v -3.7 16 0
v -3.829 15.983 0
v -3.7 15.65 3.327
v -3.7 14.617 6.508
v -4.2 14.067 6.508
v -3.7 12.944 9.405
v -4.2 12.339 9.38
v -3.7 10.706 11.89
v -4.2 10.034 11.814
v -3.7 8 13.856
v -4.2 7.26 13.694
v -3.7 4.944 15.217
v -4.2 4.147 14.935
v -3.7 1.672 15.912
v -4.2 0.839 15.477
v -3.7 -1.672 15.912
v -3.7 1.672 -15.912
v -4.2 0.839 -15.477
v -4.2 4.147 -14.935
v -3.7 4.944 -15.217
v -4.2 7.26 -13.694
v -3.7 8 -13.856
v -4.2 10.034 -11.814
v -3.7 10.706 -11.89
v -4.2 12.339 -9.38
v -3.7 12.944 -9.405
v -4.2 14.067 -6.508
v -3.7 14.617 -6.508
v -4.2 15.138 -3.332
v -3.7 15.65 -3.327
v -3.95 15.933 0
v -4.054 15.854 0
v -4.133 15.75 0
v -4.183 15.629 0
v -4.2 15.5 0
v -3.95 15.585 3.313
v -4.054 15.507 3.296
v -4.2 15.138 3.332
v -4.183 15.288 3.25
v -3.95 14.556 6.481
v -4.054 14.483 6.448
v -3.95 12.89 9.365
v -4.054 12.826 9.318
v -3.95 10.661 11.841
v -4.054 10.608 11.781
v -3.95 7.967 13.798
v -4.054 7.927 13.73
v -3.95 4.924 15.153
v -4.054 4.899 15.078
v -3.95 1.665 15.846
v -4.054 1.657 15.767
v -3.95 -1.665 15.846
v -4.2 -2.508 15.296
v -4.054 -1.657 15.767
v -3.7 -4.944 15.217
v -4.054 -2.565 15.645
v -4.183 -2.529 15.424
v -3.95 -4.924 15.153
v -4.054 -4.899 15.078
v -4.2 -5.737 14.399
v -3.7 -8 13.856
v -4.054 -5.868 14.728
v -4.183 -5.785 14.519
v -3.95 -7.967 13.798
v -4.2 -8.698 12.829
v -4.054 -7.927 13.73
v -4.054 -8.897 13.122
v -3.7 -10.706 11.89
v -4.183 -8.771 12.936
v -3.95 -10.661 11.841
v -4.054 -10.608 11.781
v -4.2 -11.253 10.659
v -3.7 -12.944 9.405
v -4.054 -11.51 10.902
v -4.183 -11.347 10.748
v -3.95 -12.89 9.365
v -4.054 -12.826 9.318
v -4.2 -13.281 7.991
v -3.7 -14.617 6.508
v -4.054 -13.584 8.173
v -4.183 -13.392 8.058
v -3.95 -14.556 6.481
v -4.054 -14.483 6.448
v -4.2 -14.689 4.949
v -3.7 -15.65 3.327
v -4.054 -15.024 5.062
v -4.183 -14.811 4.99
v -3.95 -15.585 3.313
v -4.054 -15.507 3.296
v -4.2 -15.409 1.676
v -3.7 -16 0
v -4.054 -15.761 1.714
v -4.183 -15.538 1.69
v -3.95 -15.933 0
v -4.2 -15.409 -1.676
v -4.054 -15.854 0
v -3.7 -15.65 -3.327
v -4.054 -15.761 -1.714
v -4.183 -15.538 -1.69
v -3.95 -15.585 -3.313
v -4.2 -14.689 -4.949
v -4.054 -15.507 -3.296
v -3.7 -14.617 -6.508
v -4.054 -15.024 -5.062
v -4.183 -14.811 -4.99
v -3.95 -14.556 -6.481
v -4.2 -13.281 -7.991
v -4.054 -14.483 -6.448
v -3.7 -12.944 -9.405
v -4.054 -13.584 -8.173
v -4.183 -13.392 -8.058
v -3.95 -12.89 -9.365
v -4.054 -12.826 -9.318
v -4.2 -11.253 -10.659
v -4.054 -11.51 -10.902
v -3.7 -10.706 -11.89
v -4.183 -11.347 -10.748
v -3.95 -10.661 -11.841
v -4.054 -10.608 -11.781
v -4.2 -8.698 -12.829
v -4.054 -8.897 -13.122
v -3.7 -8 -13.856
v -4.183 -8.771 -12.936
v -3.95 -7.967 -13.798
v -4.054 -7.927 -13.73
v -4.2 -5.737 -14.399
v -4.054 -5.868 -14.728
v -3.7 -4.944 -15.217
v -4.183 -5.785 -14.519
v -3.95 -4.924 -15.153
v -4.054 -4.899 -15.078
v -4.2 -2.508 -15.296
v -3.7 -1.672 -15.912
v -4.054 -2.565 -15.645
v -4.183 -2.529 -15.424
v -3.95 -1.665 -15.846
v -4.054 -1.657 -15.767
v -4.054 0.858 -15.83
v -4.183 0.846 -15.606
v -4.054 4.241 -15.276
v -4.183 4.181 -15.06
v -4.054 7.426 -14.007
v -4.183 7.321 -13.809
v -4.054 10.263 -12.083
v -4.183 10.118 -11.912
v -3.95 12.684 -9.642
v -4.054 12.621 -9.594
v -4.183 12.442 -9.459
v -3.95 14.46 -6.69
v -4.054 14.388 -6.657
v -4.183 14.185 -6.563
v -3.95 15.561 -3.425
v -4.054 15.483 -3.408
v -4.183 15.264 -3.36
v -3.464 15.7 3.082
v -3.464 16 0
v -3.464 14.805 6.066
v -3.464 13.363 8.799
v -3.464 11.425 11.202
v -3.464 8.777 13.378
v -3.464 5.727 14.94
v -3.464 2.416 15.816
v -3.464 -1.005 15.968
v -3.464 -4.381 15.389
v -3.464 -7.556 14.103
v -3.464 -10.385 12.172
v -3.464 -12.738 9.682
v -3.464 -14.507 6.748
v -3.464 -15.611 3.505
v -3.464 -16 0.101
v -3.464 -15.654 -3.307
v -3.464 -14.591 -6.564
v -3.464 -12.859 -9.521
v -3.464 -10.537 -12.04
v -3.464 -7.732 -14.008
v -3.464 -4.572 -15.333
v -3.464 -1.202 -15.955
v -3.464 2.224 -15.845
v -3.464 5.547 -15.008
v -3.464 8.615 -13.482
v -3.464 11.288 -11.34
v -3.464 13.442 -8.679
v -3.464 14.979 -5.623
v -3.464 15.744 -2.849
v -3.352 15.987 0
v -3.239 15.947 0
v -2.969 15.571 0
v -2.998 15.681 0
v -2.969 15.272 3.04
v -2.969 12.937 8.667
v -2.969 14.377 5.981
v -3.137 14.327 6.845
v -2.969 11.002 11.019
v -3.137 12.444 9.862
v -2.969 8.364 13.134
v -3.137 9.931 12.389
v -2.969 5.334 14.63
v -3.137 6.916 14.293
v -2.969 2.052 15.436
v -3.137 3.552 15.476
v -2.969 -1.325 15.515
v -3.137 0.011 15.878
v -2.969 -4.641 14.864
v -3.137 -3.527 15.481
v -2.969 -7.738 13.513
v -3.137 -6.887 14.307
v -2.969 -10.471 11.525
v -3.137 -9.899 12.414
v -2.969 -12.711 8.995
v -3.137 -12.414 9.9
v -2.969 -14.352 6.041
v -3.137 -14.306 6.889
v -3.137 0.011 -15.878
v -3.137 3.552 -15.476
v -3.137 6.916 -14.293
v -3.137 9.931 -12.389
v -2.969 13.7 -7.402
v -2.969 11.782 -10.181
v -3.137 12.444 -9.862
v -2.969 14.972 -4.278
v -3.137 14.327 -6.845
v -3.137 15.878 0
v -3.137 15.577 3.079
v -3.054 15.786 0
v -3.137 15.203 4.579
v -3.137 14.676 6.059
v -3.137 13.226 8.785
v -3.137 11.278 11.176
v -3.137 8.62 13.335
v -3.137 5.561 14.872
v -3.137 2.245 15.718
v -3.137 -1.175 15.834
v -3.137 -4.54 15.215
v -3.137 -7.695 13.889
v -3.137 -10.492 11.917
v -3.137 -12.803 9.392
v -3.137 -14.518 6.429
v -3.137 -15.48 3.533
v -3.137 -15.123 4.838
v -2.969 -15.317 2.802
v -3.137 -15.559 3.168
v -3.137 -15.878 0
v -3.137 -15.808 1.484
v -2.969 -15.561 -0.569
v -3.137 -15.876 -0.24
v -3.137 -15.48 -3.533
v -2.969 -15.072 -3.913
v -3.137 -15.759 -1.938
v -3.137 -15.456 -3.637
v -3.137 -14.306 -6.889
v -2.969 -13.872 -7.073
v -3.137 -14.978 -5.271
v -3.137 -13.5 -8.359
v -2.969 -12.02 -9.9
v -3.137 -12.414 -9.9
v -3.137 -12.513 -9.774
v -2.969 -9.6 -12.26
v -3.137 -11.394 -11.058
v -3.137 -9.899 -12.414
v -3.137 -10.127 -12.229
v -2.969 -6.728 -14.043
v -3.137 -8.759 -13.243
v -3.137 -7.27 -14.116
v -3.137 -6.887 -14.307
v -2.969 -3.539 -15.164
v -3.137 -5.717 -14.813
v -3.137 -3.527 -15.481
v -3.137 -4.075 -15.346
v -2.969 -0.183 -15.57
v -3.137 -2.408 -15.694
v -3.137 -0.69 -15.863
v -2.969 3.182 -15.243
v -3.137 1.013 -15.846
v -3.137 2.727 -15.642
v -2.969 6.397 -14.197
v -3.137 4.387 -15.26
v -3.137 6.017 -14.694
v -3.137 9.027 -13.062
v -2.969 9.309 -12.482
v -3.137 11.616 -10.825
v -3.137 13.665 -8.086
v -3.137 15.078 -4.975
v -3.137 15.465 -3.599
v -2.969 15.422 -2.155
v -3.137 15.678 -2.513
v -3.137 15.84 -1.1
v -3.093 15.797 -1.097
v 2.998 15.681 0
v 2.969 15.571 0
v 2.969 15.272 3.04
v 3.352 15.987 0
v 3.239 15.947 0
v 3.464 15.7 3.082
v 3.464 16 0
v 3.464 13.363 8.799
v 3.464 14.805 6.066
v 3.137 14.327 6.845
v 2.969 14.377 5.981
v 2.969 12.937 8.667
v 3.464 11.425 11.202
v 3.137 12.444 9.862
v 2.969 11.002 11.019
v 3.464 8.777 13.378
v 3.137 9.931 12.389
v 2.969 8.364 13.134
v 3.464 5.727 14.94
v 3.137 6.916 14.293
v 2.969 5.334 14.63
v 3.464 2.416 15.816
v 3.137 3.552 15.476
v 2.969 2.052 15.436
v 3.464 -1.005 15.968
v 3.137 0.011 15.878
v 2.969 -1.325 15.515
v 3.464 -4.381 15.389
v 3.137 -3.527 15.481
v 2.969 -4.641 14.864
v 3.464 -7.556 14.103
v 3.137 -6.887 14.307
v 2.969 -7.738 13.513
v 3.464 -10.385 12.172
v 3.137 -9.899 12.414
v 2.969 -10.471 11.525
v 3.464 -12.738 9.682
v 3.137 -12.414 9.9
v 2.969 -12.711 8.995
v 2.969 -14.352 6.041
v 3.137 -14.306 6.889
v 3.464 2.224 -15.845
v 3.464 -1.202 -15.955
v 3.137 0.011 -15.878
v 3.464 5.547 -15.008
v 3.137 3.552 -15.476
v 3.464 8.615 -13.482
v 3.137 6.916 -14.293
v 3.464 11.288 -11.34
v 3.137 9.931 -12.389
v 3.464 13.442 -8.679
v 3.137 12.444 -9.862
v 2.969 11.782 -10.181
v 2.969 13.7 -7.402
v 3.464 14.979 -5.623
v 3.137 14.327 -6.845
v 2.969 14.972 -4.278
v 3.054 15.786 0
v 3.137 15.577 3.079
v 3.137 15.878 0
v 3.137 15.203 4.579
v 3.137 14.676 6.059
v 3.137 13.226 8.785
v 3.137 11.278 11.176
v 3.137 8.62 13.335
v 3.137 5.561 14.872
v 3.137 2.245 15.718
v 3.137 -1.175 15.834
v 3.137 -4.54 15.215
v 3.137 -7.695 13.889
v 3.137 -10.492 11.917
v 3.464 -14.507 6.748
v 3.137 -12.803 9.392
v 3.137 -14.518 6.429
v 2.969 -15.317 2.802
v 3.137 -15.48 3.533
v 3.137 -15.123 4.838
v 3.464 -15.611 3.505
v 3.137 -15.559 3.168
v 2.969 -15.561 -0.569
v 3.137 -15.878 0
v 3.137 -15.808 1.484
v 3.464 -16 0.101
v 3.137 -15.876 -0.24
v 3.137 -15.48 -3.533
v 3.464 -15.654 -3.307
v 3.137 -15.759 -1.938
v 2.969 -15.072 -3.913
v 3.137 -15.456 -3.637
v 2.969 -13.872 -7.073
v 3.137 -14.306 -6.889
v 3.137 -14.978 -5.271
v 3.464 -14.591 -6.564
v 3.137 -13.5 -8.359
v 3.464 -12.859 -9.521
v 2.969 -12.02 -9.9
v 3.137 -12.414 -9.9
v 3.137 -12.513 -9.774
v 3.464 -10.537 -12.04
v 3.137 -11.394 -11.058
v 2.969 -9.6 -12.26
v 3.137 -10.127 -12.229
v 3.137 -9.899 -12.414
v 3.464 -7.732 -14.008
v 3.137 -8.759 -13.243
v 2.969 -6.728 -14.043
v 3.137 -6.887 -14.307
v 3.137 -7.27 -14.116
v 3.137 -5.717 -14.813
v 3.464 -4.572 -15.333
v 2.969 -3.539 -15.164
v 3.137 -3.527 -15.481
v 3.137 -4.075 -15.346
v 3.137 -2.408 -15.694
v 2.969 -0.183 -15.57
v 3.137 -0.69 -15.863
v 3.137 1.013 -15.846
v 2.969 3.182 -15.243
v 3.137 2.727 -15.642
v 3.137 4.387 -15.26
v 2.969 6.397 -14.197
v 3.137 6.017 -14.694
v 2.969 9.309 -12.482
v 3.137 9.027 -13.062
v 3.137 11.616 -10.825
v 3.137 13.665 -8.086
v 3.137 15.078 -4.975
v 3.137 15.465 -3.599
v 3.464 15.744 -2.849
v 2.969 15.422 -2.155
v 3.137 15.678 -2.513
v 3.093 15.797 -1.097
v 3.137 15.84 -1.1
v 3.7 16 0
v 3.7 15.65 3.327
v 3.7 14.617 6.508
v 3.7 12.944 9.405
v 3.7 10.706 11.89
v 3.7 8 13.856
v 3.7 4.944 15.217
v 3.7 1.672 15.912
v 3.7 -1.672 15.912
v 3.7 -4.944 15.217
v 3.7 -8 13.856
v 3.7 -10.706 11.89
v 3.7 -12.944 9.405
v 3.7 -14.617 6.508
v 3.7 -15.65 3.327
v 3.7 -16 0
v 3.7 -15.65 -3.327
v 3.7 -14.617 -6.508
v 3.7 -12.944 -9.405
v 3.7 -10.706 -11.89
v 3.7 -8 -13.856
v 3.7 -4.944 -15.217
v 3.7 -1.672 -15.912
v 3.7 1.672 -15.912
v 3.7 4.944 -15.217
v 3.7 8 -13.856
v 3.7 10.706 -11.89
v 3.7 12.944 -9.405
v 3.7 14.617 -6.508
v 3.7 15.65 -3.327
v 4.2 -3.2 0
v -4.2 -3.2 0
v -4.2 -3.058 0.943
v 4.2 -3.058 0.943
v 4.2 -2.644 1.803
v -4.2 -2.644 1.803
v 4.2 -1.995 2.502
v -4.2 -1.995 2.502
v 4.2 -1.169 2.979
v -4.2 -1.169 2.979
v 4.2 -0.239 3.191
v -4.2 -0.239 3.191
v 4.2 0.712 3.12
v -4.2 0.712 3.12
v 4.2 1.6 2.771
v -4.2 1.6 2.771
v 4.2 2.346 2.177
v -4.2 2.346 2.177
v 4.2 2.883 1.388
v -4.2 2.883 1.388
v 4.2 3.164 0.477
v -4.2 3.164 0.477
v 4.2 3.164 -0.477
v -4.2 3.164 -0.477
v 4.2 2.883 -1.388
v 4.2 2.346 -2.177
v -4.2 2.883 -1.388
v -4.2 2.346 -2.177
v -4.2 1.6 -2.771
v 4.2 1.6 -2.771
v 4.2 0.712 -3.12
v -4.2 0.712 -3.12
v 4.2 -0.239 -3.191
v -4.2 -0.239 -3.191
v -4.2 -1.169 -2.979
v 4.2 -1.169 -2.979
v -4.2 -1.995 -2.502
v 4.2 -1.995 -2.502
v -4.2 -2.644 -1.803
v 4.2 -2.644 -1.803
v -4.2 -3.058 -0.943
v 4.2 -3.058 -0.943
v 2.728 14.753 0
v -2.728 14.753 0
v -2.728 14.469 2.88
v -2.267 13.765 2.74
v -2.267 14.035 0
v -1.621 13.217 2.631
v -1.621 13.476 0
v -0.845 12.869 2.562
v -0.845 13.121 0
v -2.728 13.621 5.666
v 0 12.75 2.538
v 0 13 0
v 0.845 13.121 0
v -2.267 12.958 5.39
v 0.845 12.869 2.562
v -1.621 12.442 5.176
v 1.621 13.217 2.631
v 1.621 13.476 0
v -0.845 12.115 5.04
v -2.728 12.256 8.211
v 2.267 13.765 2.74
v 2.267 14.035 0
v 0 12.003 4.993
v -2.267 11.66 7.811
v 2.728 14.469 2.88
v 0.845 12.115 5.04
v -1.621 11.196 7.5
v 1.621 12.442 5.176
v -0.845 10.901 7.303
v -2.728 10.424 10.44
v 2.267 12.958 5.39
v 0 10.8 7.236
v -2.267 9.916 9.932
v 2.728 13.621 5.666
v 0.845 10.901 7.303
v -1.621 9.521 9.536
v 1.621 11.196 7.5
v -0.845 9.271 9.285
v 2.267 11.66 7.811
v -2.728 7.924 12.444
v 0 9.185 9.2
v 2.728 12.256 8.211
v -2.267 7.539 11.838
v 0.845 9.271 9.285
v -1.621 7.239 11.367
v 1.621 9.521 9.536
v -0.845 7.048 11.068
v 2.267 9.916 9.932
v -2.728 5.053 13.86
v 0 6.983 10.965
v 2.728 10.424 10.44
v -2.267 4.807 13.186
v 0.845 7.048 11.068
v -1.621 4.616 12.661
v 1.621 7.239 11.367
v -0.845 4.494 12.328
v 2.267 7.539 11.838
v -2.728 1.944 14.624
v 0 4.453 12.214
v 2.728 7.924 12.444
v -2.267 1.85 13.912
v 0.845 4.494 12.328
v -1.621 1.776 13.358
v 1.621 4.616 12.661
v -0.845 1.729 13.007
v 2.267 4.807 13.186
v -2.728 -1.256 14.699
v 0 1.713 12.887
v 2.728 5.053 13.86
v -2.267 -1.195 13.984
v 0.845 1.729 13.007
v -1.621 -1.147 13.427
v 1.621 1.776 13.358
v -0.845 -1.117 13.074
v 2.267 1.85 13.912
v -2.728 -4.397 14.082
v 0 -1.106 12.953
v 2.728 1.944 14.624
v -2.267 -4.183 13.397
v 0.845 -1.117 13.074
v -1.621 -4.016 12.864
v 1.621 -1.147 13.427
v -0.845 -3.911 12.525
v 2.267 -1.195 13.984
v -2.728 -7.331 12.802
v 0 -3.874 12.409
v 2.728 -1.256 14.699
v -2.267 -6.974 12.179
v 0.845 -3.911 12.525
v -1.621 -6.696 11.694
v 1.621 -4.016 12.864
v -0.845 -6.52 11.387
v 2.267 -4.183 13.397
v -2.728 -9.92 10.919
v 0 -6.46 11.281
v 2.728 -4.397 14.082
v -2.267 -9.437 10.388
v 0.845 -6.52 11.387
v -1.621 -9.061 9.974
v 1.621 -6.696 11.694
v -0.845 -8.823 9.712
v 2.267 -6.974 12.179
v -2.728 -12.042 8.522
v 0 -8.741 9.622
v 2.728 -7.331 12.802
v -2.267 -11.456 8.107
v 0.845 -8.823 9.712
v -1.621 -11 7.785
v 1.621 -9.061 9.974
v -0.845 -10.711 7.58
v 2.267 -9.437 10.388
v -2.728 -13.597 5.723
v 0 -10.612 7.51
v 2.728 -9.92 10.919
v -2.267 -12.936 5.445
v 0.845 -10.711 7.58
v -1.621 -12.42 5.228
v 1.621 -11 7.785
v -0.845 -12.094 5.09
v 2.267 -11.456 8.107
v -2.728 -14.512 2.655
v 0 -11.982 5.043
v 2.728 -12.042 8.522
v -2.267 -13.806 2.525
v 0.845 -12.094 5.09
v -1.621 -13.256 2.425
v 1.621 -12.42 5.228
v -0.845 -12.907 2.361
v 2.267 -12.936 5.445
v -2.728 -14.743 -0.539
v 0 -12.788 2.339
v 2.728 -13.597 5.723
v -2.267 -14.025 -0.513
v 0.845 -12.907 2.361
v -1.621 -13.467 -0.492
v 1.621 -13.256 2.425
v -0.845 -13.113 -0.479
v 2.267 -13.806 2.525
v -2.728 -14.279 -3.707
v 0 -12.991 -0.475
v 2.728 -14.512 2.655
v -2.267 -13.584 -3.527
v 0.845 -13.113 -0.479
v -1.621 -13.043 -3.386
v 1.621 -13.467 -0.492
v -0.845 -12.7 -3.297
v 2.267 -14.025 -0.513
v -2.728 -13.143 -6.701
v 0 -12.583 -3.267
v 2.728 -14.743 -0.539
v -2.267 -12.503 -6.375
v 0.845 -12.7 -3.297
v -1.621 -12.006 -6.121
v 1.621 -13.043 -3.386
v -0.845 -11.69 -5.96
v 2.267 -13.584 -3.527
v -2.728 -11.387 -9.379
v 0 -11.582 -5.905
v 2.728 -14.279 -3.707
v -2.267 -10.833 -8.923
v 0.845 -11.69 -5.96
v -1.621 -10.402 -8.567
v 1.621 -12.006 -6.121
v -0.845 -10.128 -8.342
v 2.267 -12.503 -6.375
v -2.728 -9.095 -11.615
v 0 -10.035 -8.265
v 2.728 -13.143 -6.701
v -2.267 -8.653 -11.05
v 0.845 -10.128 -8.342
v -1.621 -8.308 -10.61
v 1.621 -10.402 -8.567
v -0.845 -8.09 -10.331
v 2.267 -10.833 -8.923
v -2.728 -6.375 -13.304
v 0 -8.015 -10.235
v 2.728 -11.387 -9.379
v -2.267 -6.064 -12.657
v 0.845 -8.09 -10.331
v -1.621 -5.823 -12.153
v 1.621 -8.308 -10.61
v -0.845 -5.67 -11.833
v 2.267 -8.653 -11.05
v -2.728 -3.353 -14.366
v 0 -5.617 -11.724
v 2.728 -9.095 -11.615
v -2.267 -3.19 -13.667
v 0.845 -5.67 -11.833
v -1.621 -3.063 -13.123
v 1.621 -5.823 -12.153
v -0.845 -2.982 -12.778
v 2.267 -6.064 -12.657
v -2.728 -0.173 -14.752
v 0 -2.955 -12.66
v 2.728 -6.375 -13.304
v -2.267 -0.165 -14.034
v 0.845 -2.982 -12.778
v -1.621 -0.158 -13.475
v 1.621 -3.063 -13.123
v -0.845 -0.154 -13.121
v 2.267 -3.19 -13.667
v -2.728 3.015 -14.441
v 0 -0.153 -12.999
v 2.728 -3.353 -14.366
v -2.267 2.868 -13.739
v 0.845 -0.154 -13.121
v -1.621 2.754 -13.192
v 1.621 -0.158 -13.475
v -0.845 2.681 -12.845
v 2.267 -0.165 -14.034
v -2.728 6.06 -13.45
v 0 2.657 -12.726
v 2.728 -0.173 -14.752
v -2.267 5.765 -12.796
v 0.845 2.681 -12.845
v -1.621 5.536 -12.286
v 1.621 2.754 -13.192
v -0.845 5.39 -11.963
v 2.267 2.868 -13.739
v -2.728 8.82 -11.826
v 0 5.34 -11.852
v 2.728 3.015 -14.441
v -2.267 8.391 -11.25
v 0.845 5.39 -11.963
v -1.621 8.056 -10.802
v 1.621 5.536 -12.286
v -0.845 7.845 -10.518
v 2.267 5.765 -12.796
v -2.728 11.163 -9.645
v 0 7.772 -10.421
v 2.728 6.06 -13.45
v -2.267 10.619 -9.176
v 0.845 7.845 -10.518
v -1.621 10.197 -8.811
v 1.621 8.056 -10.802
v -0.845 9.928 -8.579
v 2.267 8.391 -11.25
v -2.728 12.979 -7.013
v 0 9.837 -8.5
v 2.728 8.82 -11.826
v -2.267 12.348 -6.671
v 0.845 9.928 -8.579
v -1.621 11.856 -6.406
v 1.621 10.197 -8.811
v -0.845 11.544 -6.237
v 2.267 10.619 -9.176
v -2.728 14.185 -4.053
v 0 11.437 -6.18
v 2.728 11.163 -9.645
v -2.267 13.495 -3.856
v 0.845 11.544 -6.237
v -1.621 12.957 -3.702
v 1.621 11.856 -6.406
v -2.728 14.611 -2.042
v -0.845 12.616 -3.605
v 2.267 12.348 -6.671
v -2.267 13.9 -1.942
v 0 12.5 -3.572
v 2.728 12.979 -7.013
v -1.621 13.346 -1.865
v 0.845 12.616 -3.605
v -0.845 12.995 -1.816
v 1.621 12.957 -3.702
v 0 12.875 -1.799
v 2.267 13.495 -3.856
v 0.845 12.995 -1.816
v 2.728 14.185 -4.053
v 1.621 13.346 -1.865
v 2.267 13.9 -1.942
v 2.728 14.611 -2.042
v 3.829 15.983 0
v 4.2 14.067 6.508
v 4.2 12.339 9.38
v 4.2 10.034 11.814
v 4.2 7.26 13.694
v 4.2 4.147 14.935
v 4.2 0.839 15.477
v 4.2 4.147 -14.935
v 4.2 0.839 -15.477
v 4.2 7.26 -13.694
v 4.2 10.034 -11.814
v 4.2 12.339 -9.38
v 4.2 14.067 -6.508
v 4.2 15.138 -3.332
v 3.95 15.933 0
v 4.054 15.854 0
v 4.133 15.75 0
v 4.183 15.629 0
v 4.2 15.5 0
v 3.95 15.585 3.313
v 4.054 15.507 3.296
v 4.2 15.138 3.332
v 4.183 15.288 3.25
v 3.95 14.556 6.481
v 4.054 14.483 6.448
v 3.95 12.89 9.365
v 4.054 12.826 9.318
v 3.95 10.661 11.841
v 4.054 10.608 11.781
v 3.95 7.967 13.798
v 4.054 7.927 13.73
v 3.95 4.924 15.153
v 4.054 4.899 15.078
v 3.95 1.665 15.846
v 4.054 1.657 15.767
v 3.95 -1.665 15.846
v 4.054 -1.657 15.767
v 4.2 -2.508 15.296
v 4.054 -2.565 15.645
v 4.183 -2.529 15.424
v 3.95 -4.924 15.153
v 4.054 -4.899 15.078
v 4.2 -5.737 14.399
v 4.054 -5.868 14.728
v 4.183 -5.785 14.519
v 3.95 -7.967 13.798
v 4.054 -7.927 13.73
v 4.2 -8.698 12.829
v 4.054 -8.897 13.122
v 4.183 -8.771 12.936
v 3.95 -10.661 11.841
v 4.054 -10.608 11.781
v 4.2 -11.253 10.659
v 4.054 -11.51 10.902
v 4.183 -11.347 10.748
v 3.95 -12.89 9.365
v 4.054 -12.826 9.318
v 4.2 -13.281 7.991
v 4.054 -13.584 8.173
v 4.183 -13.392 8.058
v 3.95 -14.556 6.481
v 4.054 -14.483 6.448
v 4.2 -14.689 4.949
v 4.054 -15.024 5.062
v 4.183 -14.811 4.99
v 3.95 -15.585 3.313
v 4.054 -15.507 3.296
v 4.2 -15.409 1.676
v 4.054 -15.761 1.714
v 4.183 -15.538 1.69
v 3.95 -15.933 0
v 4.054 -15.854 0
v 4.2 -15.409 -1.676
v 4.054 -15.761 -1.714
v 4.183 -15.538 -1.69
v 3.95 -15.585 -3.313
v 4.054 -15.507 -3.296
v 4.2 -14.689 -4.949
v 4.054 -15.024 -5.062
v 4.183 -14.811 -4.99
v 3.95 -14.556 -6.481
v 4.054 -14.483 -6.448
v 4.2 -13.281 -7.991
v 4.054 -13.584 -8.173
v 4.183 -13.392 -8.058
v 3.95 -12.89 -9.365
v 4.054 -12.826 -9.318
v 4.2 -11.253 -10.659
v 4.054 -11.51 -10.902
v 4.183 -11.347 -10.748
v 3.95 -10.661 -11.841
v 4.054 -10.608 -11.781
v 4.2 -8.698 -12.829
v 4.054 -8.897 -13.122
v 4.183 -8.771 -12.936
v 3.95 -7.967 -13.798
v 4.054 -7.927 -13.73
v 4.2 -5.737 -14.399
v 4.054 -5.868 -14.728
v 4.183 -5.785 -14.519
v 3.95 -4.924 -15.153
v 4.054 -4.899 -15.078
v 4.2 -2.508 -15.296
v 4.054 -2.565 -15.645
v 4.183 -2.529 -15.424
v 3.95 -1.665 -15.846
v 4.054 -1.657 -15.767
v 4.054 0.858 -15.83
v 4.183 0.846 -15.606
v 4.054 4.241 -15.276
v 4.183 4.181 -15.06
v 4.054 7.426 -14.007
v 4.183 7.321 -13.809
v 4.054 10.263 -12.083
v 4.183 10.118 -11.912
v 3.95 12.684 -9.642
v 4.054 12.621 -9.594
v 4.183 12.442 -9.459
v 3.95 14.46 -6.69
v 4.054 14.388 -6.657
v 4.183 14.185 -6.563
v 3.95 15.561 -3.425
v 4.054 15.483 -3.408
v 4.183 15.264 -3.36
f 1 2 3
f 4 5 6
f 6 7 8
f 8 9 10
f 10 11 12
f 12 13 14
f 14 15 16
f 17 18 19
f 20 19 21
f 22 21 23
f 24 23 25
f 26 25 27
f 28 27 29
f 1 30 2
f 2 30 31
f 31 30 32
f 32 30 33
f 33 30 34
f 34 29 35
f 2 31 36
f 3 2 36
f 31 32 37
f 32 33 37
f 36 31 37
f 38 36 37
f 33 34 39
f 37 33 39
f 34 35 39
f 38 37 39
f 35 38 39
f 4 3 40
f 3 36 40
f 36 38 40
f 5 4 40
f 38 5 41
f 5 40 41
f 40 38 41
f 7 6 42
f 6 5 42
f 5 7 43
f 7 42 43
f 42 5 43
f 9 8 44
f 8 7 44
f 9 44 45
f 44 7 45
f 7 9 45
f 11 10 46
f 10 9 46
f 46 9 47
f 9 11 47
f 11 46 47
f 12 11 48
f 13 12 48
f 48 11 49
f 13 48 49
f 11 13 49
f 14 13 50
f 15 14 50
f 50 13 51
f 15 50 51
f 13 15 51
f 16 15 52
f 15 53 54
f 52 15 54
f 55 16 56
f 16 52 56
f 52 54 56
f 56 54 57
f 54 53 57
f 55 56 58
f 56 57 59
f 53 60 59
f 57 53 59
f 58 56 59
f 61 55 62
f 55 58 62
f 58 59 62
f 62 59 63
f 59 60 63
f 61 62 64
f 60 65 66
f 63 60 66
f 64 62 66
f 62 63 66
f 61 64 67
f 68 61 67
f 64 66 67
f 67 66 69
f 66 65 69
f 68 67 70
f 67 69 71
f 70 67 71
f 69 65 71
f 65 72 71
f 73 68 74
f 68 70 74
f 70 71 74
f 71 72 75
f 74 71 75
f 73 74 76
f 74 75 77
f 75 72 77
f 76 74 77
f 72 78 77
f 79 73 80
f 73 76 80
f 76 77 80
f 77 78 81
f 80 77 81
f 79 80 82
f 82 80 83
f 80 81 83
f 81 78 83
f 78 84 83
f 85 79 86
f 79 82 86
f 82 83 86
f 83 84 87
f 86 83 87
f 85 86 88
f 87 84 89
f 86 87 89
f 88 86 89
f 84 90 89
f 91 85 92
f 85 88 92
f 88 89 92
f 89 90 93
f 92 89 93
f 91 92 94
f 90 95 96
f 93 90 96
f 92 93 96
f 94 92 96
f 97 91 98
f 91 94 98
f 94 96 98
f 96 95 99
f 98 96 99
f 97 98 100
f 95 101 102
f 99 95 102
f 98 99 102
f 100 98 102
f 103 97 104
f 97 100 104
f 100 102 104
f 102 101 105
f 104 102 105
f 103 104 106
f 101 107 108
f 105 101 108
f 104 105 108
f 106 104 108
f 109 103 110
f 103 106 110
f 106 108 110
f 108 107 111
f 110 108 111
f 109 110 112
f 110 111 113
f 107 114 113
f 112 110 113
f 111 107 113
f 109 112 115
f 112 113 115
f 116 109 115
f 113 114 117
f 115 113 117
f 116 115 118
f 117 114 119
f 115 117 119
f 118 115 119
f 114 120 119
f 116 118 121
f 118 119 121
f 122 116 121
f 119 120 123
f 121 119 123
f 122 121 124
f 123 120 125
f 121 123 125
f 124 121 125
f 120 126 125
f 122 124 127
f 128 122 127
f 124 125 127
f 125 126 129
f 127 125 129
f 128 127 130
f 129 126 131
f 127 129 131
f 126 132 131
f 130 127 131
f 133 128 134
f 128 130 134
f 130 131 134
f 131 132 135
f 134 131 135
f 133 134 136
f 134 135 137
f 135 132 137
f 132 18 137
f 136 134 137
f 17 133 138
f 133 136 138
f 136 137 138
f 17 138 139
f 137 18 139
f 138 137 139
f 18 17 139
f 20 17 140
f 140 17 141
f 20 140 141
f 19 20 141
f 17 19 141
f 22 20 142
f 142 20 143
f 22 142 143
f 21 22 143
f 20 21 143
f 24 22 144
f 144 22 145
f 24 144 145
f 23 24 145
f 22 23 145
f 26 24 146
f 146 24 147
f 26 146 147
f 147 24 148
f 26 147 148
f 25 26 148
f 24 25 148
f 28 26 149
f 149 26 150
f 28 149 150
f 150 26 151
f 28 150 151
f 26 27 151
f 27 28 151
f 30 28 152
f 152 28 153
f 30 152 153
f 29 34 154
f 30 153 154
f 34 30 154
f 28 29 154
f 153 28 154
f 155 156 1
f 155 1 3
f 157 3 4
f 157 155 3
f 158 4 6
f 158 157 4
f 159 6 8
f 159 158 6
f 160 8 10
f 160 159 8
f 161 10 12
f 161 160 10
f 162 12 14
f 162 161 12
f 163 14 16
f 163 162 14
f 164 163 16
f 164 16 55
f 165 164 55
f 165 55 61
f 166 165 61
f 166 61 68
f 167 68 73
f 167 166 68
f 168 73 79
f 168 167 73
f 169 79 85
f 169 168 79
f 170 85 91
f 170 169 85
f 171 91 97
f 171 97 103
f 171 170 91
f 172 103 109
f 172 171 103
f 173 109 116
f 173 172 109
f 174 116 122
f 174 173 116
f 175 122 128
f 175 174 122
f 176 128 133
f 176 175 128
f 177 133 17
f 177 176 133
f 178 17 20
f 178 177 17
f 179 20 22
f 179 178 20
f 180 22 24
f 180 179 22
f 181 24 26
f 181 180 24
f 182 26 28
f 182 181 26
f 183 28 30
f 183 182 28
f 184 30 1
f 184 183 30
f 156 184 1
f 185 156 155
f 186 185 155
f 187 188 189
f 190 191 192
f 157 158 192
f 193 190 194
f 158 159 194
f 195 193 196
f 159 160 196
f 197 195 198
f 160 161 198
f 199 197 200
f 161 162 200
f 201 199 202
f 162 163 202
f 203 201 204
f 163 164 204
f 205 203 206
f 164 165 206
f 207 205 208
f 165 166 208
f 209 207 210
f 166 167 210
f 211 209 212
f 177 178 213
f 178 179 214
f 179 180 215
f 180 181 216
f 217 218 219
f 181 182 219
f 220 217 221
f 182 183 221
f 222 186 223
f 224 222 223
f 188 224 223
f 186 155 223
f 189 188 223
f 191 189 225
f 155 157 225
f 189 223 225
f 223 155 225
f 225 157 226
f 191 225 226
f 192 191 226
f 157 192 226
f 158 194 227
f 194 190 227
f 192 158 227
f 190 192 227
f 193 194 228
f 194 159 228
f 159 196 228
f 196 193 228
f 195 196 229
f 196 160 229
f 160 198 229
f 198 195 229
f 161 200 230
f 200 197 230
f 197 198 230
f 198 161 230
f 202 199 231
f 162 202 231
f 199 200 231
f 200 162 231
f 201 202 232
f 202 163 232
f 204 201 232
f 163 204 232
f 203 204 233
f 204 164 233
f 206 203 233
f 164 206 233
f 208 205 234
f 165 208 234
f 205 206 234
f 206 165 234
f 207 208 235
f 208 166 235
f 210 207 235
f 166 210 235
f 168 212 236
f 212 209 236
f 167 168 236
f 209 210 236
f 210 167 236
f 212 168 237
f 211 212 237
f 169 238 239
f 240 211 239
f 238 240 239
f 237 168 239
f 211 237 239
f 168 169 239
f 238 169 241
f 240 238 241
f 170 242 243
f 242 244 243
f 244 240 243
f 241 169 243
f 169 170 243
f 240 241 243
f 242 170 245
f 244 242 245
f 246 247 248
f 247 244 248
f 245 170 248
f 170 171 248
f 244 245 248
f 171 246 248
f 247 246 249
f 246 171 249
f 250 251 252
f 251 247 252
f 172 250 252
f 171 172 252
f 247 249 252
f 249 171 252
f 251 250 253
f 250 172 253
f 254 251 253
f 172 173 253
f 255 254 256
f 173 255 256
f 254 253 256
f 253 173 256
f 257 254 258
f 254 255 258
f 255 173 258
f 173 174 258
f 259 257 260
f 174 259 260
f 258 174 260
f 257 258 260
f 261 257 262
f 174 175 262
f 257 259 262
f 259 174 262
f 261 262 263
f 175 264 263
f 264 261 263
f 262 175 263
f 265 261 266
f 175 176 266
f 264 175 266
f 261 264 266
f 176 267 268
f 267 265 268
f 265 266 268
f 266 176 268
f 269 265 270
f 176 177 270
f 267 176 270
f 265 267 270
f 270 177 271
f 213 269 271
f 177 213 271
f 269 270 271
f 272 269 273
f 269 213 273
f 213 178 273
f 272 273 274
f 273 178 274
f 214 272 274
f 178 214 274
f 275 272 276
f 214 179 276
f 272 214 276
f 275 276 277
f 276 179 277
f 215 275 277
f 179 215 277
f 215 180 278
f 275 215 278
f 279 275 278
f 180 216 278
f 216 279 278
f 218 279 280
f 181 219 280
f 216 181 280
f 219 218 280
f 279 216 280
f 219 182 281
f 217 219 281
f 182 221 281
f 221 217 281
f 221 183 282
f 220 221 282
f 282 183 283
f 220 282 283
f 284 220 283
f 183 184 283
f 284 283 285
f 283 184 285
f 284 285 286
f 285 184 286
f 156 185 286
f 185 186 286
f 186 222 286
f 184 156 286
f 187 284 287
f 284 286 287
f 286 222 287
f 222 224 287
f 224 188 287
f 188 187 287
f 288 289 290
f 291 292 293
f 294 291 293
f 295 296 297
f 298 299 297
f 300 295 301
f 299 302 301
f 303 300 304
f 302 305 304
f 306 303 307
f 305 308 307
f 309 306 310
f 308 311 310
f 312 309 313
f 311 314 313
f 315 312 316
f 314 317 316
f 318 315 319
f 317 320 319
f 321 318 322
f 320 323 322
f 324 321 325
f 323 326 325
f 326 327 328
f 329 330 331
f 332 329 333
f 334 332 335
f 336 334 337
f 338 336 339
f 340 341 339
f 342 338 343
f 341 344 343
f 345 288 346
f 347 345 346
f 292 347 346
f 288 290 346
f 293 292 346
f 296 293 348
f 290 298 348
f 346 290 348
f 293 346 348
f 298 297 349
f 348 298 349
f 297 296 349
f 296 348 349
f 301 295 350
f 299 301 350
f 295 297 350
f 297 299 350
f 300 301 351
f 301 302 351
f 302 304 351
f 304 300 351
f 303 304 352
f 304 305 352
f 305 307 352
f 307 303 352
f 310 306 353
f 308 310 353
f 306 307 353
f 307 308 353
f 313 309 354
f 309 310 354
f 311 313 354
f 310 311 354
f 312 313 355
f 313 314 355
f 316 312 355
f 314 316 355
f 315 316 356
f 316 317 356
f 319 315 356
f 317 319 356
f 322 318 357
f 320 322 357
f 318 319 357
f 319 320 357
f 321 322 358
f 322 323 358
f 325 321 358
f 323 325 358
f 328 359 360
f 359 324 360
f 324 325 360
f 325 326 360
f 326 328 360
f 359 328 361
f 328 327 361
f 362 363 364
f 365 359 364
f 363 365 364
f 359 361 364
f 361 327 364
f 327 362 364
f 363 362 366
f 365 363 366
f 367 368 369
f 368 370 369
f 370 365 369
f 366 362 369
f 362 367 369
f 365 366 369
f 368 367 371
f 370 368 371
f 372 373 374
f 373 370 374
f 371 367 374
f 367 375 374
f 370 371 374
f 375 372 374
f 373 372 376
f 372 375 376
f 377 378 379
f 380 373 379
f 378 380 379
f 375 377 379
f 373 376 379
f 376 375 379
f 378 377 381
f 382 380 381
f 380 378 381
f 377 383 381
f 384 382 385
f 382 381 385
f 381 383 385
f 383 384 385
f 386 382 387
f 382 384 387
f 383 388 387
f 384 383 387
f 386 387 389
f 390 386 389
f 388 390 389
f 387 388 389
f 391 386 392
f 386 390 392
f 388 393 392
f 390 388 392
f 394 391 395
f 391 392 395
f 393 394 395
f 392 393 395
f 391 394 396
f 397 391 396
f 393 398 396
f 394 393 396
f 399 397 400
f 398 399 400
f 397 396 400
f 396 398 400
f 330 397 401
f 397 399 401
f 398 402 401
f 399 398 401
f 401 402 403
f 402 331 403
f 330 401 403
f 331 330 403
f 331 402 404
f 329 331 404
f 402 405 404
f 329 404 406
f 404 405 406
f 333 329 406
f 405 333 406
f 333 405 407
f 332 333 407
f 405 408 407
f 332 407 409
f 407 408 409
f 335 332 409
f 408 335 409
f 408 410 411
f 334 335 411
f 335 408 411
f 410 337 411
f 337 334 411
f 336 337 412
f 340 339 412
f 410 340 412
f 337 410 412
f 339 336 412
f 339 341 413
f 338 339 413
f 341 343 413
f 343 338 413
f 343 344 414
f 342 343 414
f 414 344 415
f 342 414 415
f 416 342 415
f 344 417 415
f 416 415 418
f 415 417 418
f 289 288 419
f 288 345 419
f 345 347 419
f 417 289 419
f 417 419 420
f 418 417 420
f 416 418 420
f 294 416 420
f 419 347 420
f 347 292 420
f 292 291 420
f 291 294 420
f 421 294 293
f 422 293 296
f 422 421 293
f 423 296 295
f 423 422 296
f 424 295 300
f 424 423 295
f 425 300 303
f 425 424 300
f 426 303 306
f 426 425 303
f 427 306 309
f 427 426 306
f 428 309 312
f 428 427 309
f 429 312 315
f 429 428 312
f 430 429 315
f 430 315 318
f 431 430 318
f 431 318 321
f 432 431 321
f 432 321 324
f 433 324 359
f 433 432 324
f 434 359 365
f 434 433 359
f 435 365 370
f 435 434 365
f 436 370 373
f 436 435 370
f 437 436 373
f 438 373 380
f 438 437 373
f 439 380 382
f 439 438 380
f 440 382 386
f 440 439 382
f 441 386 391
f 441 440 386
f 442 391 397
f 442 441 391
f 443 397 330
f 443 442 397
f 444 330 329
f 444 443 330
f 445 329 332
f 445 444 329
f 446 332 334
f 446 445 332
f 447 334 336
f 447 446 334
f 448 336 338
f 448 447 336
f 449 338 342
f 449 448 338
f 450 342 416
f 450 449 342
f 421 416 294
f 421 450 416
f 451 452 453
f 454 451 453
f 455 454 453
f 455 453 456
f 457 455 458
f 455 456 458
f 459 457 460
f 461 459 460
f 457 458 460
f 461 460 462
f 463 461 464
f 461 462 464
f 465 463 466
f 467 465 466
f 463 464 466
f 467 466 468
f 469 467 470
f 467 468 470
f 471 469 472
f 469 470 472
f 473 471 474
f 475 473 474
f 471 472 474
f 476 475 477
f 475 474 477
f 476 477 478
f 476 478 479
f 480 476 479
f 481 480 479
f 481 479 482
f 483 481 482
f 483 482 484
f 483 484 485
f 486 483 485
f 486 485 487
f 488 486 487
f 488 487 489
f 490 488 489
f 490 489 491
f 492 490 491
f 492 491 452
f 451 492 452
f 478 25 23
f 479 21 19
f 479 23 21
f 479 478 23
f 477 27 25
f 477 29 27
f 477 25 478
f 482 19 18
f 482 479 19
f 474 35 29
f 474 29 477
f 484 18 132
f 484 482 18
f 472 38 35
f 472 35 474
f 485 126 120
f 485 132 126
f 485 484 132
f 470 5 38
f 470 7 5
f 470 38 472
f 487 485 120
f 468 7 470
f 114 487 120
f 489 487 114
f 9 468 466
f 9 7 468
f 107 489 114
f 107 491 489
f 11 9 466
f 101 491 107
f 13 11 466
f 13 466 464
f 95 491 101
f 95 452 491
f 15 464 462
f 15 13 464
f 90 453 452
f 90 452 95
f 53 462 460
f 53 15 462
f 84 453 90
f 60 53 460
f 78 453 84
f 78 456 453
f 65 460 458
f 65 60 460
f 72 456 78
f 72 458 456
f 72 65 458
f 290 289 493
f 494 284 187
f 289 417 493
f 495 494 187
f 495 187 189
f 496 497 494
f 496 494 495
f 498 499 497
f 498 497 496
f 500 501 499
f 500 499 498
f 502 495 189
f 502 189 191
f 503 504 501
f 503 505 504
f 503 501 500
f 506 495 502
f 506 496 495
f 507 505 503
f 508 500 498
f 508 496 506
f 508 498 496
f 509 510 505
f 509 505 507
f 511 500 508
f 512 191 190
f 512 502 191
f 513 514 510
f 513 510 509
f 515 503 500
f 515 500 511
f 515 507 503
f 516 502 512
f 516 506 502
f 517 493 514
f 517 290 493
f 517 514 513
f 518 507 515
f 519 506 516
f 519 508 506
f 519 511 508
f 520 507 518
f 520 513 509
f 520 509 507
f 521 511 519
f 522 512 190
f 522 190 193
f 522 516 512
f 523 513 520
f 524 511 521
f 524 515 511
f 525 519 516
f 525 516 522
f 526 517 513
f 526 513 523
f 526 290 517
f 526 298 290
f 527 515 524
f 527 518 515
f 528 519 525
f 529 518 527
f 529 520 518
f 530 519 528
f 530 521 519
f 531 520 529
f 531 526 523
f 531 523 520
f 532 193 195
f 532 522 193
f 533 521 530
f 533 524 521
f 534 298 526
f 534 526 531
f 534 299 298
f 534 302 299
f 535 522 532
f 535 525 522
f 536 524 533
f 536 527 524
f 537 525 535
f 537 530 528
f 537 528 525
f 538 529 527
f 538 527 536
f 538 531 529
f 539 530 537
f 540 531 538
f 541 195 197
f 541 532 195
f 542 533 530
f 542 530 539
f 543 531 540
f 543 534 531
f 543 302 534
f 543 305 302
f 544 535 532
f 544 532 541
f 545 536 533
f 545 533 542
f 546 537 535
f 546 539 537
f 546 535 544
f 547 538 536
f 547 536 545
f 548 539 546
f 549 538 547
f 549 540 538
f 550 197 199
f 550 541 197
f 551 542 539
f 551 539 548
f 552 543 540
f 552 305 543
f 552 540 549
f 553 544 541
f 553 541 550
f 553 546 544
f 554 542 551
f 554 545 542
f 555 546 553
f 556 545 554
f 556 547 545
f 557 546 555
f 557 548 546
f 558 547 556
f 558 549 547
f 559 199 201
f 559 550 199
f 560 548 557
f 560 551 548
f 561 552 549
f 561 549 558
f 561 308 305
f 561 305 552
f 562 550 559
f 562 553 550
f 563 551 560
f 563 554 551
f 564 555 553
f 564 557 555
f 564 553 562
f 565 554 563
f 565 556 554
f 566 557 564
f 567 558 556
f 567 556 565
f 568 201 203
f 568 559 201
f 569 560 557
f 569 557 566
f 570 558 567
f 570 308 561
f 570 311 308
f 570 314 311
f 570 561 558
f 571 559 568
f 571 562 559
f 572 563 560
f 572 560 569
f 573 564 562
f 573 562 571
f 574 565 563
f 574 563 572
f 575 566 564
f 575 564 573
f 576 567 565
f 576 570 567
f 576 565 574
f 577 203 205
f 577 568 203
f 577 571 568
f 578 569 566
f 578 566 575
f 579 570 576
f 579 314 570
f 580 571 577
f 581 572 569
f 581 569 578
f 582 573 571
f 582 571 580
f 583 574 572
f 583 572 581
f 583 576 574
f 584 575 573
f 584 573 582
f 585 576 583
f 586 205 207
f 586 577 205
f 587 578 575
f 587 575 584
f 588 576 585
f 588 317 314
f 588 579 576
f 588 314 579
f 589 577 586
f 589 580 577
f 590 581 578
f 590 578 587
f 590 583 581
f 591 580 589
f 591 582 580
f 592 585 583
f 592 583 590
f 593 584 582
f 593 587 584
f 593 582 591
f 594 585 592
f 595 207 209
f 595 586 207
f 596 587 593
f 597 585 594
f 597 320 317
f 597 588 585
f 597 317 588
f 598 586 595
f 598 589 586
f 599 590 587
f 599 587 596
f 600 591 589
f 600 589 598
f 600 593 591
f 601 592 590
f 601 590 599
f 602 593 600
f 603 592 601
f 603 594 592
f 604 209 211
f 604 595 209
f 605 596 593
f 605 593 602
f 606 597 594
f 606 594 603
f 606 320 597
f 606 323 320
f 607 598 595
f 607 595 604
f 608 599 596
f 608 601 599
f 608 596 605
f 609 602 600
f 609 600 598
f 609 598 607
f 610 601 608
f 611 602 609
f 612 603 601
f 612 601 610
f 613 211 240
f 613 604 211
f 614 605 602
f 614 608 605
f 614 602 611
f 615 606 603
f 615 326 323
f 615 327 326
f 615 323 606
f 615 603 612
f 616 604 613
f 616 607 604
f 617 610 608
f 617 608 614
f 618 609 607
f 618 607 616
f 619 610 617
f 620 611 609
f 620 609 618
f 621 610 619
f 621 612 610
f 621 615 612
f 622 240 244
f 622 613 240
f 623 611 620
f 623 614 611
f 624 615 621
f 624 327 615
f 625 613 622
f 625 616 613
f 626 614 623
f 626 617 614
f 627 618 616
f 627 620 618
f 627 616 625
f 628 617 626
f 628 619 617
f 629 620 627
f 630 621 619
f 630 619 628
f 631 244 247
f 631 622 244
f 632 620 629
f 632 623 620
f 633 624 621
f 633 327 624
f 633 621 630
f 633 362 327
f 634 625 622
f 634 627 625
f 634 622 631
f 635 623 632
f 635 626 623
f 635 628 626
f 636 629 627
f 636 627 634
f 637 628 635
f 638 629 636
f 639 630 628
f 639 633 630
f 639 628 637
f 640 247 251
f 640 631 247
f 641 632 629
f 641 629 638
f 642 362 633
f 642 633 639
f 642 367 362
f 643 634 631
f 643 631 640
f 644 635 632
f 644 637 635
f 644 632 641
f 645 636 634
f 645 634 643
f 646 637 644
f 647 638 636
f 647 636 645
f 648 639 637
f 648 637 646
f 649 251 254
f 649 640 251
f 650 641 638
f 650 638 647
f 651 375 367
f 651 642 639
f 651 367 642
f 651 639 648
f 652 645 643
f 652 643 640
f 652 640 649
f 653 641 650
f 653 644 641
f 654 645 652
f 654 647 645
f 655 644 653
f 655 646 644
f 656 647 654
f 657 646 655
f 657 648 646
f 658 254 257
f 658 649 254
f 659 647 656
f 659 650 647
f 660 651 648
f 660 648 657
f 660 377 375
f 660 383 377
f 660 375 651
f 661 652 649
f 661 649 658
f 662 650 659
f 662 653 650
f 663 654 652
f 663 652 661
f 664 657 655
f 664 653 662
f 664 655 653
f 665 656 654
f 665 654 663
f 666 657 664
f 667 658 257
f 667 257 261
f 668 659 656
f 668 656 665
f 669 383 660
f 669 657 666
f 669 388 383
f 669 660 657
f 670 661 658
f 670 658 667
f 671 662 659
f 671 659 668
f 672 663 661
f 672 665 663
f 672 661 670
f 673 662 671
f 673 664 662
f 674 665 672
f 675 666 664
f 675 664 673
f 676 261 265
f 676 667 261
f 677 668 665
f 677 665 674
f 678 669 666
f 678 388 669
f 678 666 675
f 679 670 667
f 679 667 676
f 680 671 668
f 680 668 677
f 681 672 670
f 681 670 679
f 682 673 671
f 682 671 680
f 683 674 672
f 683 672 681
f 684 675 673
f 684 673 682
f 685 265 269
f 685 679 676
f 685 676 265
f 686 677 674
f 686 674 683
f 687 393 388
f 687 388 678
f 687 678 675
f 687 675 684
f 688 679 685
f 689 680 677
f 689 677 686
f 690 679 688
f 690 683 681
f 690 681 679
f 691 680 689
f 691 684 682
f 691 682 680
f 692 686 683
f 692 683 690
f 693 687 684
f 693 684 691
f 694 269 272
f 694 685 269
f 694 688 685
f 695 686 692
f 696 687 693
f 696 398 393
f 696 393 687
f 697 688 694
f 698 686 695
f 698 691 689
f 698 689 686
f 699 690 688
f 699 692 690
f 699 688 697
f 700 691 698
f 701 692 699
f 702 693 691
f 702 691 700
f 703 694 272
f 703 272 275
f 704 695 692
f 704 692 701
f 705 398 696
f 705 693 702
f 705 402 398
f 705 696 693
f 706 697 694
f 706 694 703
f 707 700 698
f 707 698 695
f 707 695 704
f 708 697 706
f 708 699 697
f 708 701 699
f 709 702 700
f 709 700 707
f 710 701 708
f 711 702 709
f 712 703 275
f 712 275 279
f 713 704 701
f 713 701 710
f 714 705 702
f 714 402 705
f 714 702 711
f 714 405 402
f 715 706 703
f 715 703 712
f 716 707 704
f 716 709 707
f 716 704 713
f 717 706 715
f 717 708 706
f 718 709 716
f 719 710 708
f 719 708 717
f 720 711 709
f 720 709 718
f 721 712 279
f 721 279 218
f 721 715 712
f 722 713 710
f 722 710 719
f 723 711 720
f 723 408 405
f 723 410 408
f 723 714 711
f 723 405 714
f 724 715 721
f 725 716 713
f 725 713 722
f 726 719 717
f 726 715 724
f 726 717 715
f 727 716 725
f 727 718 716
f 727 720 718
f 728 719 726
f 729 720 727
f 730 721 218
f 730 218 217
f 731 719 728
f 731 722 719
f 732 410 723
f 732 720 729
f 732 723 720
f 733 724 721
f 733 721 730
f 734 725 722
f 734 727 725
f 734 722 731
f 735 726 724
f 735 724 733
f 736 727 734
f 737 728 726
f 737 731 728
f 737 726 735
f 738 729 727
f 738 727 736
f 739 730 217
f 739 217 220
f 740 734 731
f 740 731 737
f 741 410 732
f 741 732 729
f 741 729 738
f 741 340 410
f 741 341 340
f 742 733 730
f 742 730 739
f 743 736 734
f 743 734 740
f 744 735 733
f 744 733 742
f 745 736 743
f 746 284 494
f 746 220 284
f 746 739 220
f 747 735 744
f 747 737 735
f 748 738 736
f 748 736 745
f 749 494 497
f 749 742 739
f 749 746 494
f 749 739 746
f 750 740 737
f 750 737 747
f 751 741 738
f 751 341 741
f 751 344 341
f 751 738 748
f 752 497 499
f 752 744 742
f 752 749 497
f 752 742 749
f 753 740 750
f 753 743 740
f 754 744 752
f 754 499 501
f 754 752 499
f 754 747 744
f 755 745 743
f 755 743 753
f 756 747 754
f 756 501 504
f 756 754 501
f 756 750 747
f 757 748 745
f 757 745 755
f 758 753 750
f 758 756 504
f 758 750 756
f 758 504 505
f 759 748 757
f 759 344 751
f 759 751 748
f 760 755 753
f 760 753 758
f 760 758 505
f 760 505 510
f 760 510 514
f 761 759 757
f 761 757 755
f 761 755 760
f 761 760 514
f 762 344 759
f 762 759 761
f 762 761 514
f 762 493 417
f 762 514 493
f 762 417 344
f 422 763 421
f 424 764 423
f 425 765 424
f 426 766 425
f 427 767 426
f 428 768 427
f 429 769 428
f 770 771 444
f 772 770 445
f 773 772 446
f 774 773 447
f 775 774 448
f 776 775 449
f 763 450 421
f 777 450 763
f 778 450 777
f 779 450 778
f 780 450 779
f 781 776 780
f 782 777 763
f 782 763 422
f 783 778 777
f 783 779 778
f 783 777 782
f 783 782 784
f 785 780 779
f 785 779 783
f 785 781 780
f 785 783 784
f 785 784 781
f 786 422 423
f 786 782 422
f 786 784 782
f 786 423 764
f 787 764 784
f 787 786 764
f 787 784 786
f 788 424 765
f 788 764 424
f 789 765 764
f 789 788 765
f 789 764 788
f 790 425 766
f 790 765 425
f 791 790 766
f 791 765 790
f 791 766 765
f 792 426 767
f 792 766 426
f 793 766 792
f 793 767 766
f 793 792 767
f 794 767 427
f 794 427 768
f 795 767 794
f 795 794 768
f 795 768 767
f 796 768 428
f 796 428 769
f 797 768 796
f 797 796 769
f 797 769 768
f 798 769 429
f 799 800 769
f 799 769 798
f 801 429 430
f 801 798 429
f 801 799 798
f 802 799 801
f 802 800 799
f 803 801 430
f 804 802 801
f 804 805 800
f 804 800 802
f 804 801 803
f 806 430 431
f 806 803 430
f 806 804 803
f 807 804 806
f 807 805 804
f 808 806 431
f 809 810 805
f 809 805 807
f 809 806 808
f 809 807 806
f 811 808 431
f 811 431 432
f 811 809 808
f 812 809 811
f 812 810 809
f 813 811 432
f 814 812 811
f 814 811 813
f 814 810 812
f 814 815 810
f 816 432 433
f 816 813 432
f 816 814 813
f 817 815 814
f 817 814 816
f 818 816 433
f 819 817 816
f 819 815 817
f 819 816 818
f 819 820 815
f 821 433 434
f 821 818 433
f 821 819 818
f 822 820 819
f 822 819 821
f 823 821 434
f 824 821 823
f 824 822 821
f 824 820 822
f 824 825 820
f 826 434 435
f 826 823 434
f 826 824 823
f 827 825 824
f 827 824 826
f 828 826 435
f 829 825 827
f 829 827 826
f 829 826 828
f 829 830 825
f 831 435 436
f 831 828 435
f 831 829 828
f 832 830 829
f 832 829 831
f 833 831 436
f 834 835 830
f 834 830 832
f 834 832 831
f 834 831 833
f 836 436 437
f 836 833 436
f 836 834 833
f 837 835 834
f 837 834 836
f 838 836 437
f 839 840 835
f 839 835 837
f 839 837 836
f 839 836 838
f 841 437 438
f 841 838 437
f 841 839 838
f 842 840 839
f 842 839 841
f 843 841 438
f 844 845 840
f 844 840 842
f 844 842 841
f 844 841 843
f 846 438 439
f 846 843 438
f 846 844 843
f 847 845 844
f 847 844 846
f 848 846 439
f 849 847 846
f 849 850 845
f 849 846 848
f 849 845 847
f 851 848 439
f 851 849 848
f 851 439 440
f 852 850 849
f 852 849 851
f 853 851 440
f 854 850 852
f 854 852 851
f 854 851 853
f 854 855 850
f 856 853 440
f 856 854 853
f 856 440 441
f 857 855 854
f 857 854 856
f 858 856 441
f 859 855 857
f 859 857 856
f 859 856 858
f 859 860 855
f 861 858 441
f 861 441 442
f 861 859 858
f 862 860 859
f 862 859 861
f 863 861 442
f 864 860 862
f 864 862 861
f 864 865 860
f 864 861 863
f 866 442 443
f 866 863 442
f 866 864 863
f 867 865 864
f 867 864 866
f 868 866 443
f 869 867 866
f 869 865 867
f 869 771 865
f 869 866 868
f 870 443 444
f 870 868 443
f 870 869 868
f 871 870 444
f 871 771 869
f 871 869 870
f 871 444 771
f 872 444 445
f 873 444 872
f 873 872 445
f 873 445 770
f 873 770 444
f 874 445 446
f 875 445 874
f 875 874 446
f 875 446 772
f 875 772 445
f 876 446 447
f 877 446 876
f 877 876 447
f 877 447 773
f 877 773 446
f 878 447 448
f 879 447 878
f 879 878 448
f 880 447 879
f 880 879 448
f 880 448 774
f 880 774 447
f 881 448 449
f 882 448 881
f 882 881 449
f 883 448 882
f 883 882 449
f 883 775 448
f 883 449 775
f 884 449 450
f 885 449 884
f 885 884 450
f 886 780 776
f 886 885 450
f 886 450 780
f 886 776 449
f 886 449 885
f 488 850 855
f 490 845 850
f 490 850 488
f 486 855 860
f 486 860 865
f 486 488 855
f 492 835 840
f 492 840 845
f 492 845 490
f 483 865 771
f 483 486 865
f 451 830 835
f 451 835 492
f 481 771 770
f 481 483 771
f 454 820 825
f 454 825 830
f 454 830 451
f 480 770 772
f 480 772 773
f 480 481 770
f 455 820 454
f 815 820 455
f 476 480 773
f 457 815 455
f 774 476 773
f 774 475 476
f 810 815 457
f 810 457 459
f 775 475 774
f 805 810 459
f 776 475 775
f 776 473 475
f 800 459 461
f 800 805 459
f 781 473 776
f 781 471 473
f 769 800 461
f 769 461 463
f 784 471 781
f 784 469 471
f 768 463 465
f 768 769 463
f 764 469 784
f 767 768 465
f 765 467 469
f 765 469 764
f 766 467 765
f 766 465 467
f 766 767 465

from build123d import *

# Parameters (mm, degrees)
SKETCH001_R  = 3.2
POCKET_DEPTH = 8.401
FILLET_R     = 0.5


with BuildPart() as part:
    # Sketch → Revolution (revolve)
    with BuildSketch(Plane.XY):
        with BuildLine():
            Line((-4.2, 16), (-3, 16))
            ThreePointArc((-3, 16), (0, 13), (3, 16))
            Line((3, 16), (4.2, 16))
            Line((4.2, 16), (4.2, 0))
            Line((4.2, 0), (-4.2, 0))
            Line((-4.2, 0), (-4.2, 16))
        make_face()
    revolve(axis=Axis((0, 0, 0), (1, 0, 0)))

    # Sketch001 → Pocket (cut, through all)
    with BuildSketch(Plane(origin=(-4.2, 0, 0), x_dir=(0, -1, 0), z_dir=(-1, 0, 0))):
        Circle(SKETCH001_R)
    extrude(amount=-POCKET_DEPTH, mode=Mode.SUBTRACT)

    # Fillet
    fillet_edges = [part.edges().sort_by_distance(p)[0] for p in [
        (-3, -16, 0),
        (3, -16, 0),
        (-4.2, -16, 0),
        (4.2, -16, 0),
    ]]
    fillet(fillet_edges, radius=FILLET_R)


solid = part.part
